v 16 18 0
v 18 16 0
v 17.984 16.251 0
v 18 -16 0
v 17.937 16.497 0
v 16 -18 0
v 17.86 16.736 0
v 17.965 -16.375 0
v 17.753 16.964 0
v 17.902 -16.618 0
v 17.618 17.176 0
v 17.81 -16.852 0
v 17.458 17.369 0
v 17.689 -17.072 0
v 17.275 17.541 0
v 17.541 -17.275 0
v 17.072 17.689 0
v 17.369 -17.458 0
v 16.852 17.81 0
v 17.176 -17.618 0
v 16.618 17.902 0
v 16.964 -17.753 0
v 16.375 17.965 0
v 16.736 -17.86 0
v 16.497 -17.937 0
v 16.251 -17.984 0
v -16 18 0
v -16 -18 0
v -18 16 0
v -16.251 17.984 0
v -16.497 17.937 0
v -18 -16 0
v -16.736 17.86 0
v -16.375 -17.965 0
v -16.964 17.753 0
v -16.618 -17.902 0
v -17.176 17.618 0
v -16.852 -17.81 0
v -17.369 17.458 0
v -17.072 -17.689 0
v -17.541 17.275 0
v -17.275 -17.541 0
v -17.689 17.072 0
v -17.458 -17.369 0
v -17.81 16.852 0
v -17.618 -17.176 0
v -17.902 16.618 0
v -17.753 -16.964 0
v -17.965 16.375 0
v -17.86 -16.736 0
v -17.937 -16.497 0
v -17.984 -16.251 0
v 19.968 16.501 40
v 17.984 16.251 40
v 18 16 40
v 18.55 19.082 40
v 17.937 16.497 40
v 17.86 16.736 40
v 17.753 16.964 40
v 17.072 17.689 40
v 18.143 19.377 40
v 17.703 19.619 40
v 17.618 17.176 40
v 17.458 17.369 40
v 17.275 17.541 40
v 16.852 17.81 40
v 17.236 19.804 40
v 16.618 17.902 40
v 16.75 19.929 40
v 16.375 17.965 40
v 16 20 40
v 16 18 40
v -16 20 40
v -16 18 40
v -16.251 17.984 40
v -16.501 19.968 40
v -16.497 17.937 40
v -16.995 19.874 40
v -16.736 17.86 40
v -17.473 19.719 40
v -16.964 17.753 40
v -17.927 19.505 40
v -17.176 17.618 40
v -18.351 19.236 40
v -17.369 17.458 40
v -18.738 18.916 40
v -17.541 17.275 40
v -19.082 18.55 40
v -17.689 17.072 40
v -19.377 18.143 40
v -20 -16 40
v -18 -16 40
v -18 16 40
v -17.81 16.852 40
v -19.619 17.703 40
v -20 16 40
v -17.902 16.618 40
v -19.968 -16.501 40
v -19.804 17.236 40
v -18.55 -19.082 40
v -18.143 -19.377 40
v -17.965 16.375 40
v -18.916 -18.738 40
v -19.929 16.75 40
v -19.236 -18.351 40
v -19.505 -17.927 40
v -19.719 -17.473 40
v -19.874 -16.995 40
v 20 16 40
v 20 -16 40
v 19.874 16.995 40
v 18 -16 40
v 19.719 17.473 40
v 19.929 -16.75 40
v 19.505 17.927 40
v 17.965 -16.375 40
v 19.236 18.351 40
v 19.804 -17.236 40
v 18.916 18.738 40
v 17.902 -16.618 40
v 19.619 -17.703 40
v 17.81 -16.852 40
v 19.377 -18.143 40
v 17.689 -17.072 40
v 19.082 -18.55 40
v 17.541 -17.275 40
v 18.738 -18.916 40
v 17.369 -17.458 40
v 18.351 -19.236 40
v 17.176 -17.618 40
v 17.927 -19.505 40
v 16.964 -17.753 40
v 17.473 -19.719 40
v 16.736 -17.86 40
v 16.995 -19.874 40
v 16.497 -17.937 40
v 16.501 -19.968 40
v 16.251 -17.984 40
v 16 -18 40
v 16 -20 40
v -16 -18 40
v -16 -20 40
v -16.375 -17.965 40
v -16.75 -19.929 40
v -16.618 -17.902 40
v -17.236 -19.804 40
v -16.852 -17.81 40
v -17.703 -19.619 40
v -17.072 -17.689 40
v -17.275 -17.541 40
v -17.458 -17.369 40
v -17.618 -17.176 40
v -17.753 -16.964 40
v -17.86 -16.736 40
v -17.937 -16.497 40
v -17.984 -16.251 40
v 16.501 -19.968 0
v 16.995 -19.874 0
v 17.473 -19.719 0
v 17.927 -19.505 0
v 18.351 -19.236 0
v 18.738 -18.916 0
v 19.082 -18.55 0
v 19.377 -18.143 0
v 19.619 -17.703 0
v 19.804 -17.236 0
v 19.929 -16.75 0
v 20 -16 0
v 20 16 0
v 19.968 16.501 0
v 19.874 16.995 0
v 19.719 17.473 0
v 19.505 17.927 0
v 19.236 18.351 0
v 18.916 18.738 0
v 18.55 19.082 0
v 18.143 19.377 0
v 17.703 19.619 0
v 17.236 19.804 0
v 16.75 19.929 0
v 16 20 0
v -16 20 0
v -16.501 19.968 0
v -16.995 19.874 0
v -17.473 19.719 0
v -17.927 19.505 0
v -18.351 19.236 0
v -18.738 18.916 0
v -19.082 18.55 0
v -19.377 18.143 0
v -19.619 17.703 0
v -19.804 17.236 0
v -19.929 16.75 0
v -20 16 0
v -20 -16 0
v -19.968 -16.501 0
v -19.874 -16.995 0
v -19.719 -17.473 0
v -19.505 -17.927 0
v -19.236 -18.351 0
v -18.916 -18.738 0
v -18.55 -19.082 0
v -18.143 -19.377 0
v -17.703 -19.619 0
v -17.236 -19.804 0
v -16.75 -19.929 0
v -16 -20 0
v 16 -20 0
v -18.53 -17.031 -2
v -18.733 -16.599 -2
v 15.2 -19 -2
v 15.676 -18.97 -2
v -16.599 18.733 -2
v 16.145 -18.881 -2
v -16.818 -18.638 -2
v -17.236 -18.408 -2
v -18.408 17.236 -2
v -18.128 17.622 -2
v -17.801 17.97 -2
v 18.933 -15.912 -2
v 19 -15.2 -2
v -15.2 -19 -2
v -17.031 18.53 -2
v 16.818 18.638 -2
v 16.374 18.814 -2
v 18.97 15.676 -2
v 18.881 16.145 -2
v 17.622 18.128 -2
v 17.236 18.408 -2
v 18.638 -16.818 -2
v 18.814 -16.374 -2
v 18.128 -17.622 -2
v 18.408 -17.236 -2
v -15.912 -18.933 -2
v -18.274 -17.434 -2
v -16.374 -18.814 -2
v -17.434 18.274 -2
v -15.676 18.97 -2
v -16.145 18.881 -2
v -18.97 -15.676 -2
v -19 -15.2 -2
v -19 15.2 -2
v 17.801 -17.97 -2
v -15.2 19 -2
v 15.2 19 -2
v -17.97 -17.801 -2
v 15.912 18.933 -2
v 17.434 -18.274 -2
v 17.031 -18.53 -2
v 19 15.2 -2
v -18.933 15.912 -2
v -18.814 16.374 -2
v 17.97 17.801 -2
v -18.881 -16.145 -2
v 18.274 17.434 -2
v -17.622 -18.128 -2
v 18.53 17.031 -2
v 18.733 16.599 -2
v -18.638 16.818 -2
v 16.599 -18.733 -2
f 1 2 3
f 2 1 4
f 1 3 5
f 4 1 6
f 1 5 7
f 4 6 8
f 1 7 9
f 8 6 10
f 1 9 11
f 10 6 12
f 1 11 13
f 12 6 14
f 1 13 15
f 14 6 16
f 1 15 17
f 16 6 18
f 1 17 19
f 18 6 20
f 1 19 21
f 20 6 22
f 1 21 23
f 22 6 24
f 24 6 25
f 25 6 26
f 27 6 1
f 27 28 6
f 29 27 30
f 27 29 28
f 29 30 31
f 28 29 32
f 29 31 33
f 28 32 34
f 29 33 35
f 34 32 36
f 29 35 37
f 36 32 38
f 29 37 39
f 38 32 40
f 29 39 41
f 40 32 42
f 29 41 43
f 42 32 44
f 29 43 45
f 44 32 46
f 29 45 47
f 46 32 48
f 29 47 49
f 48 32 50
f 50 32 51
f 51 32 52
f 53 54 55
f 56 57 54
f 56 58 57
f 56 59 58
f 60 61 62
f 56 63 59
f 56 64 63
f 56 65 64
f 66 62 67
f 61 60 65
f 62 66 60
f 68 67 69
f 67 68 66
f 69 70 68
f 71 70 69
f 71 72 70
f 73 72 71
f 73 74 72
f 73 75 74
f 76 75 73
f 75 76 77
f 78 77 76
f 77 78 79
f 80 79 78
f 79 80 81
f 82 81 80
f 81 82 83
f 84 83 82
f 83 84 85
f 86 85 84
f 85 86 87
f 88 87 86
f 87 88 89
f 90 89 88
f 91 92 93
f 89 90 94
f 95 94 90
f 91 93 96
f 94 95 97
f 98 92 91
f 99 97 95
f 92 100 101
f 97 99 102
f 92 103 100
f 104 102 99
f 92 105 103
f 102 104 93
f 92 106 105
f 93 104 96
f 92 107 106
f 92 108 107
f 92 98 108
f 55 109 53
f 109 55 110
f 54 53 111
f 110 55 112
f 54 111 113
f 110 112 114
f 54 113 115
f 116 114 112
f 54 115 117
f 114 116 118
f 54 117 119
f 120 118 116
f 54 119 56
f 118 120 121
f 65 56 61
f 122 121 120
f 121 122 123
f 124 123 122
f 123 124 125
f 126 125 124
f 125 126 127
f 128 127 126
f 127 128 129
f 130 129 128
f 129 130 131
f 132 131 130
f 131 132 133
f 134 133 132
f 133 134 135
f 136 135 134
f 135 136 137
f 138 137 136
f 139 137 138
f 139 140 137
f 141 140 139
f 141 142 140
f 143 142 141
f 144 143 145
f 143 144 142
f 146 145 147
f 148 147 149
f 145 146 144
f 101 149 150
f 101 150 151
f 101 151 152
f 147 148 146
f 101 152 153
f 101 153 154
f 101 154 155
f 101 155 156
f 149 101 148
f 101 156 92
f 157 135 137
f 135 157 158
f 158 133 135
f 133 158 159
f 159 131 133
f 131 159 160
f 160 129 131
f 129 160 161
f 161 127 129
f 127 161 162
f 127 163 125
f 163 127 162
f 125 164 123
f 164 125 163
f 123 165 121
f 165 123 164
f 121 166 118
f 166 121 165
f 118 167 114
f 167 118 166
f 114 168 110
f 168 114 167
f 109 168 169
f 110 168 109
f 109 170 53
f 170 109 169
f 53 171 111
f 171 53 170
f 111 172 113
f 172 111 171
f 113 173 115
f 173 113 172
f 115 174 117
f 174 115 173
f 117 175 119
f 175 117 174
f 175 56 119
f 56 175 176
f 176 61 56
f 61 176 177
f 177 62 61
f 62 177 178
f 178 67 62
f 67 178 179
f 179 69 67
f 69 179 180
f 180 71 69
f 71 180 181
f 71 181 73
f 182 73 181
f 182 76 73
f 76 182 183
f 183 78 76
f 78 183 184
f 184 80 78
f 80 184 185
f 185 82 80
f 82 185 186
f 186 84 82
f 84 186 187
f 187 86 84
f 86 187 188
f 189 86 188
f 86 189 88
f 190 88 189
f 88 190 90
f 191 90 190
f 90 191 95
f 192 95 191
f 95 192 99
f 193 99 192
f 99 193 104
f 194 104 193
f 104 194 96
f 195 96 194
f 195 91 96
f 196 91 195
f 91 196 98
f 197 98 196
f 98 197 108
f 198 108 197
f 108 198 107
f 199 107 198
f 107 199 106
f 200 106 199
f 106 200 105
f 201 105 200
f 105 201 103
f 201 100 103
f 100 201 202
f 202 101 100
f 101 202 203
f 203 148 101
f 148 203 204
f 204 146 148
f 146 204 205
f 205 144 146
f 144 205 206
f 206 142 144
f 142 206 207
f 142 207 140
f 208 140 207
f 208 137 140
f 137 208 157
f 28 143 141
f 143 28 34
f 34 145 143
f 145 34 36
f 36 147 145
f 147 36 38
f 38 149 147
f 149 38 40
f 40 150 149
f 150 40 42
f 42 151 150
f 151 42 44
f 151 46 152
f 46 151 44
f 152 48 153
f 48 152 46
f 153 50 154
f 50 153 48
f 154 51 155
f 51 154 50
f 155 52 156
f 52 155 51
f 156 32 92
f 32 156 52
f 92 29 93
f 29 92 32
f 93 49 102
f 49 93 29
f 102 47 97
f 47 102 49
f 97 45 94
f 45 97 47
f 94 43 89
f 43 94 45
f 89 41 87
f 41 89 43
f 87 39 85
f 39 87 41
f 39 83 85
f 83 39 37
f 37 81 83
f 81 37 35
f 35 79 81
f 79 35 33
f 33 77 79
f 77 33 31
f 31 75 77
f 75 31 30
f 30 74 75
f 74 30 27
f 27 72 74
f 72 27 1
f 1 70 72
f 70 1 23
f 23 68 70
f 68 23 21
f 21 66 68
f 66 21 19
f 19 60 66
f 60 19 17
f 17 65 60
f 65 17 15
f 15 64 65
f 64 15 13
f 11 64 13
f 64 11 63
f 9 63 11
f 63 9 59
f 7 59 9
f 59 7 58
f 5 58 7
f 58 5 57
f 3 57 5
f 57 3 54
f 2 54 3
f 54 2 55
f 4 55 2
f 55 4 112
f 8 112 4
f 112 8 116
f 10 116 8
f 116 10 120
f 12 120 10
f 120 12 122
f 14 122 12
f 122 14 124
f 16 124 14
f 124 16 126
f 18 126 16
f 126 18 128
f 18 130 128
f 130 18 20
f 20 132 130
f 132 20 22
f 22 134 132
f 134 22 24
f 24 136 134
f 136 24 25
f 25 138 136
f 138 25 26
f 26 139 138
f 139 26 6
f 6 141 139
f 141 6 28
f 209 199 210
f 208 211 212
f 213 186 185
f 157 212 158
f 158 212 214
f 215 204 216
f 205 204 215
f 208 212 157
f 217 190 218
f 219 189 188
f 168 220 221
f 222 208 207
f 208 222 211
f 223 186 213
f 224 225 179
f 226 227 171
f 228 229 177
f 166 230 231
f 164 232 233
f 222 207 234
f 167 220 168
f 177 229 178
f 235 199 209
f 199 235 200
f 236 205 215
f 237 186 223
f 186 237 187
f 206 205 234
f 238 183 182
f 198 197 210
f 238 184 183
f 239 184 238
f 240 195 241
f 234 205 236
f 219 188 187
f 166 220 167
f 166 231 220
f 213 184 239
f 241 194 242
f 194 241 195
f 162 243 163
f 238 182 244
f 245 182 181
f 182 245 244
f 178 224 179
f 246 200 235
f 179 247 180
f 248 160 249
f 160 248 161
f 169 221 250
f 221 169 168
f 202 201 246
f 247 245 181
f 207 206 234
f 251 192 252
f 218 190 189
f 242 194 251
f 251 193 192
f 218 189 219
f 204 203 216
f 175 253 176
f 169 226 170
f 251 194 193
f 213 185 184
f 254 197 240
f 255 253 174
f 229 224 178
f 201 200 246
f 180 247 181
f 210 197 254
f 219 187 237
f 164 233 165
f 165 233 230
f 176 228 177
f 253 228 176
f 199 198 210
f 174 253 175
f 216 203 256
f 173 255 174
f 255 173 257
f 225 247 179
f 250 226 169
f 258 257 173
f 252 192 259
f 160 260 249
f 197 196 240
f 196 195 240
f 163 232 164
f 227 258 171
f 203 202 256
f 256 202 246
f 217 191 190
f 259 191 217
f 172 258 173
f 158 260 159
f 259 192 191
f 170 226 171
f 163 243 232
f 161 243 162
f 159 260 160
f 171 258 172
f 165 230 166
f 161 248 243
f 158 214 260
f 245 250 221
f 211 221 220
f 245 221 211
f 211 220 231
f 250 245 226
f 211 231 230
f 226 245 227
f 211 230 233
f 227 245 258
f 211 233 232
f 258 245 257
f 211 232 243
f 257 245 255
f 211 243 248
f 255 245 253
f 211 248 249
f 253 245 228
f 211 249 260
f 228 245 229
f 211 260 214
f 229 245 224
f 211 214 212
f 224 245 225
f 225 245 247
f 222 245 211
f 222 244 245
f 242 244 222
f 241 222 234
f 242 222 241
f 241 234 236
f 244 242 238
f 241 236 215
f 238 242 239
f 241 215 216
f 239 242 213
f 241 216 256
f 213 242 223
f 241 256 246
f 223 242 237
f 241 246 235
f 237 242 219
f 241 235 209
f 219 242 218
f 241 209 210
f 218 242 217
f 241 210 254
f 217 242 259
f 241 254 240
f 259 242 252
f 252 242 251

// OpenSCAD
totalHeight = 40;
width = 40;
radius = 4;
thickness = 2;

prullenbak(totalHeight,thickness,width,radius);

//This is how smooth the radius will be
$fn = 25*2;

///////JONGE VET DIT
module prullenbak(totalHeight=30, thickness = 2, width = 40, radius = 4 ){
    binnenradius = (radius > thickness) ? radius - thickness : 0;
    
    linear_extrude(height=totalHeight){
        difference(){
            offset(r=radius){
                square(width-(2*radius), center = true);
            }
            offset(r=binnenradius){
                square((width-(2*thickness)-(2*binnenradius)), center = true);
            }
        }
    }

translate([0,0,-thickness]){
    linear_extrude(height=thickness, scale = 1/0.95){
        scale(0.95){
        offset(r=radius){
           square(width-(2*radius), center = true);
        }
    }
    }
}
}
